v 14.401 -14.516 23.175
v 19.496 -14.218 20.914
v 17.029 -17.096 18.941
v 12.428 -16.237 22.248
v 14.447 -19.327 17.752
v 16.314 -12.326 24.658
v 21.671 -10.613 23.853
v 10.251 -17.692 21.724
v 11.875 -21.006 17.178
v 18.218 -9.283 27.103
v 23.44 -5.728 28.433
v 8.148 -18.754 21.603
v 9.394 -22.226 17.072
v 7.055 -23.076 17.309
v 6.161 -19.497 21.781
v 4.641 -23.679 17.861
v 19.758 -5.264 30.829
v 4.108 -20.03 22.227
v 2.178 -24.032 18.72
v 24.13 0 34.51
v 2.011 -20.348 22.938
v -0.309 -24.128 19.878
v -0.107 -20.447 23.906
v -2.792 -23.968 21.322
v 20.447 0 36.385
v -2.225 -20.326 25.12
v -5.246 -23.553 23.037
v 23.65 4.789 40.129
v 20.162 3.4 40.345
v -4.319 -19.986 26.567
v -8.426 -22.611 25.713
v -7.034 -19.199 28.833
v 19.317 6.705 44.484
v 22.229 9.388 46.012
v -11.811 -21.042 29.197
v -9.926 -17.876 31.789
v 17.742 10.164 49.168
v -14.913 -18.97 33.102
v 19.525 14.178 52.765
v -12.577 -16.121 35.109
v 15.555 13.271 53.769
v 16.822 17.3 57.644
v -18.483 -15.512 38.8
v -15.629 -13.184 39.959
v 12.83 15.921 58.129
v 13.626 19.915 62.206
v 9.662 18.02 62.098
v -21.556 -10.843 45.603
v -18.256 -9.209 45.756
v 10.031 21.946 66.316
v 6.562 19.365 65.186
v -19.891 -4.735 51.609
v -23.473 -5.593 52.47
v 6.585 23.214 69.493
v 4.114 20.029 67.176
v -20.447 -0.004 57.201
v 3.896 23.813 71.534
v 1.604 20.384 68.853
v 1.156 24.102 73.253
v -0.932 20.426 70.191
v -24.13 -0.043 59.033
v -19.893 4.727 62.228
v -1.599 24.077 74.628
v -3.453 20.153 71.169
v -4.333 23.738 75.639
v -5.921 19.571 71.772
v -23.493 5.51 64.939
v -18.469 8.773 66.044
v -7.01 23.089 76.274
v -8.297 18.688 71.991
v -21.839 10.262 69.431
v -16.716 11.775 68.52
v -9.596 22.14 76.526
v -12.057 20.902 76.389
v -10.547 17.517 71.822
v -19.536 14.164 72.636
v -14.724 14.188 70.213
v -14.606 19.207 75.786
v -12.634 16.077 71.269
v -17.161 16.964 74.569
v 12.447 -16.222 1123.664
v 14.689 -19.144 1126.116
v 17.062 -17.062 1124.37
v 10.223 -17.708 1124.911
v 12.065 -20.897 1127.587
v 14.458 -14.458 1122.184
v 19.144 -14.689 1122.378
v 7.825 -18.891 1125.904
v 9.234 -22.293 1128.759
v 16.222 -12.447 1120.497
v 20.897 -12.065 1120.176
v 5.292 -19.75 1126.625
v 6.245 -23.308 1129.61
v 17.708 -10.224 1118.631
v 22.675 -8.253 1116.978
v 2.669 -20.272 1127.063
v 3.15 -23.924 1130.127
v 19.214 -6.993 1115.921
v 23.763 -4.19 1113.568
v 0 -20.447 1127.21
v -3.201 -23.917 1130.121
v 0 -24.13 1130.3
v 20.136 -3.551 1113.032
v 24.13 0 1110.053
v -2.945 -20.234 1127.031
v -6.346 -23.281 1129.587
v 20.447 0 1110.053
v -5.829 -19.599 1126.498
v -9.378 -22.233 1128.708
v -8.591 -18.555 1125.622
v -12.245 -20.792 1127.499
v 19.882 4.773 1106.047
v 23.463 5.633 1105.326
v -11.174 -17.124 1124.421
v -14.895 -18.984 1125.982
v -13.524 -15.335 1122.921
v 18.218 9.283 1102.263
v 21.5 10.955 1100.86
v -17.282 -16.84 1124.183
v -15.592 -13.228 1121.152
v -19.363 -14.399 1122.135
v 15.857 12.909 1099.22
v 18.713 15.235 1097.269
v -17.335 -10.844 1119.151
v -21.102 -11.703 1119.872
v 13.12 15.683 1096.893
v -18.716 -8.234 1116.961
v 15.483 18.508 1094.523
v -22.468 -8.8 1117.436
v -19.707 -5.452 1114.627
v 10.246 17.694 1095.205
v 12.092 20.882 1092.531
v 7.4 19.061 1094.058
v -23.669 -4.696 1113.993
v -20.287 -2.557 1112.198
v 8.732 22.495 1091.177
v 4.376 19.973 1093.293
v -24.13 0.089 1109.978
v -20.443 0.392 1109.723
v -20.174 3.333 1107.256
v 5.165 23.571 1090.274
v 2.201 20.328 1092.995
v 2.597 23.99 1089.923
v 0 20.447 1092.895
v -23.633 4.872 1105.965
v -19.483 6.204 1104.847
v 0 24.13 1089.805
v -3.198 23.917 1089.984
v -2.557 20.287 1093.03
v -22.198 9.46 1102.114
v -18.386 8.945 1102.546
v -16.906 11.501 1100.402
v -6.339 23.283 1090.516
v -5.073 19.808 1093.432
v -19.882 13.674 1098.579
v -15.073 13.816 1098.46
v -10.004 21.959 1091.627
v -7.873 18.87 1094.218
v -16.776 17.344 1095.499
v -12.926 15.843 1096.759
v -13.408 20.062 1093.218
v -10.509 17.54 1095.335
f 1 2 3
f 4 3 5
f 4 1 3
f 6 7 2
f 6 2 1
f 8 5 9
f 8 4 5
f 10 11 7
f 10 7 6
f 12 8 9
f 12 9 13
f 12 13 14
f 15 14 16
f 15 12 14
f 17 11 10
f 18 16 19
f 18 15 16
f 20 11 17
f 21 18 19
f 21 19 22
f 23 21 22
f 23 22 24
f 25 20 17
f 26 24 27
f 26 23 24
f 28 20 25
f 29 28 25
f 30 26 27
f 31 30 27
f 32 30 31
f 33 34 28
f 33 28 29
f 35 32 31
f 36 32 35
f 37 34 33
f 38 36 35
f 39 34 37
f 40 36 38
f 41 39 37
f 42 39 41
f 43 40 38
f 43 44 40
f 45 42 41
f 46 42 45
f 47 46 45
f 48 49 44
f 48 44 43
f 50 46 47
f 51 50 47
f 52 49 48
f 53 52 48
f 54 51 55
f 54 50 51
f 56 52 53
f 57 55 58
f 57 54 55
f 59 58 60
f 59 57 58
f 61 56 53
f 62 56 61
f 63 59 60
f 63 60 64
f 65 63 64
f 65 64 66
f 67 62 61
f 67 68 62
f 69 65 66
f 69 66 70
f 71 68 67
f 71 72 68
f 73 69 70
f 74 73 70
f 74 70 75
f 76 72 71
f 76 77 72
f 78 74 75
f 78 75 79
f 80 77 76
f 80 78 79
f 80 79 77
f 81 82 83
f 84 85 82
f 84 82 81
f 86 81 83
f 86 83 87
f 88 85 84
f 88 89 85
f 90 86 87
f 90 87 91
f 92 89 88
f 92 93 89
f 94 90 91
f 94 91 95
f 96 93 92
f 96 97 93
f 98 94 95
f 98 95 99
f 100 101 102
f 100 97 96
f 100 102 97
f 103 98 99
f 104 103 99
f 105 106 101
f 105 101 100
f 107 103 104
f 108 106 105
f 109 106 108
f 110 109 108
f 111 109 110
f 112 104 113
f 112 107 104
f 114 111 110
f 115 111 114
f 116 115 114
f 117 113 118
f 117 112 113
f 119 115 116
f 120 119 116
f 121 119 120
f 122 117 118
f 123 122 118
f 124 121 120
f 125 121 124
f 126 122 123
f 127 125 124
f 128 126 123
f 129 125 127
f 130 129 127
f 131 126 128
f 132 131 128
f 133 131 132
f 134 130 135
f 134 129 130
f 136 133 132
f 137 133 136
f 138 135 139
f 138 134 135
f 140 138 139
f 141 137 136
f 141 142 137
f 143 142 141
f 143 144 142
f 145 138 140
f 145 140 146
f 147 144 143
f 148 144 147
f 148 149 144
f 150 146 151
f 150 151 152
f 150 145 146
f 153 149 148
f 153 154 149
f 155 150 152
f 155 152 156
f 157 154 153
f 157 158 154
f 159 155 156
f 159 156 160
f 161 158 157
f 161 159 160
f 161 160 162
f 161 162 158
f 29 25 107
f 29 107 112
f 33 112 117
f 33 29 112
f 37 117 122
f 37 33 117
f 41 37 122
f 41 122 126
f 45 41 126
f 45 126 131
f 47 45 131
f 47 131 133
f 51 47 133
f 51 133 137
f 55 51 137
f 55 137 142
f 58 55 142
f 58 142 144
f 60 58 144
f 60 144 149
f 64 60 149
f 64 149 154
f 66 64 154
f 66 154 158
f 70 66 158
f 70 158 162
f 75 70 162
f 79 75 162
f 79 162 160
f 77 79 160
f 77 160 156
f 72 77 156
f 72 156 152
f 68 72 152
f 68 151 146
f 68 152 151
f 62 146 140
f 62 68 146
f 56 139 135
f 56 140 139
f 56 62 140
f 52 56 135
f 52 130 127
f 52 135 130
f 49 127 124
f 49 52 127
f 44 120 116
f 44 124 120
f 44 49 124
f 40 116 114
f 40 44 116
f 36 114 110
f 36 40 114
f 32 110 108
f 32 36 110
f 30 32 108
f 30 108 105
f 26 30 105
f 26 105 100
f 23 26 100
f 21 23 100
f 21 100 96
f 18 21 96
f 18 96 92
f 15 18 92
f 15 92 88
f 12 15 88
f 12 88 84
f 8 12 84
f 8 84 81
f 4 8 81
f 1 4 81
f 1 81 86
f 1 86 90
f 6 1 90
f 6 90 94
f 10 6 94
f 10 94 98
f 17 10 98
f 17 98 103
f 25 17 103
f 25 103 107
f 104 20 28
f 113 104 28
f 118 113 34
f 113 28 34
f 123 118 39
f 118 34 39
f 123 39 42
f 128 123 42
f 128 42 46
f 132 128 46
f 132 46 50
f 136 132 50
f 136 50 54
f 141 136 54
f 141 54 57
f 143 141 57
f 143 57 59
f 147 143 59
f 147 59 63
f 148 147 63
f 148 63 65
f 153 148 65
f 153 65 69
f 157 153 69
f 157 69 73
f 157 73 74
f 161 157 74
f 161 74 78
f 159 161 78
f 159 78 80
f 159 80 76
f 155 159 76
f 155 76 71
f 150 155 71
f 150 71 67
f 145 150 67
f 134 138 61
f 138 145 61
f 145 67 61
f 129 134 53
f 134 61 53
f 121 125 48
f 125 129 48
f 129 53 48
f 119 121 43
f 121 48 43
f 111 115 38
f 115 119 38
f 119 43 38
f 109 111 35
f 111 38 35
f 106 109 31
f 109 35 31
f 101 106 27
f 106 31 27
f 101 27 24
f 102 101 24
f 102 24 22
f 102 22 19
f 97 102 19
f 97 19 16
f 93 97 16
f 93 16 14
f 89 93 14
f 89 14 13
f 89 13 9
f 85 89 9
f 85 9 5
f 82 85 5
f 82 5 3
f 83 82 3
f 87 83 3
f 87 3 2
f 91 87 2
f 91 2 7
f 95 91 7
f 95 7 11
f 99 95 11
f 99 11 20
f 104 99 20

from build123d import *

# Parameters (mm, degrees)
F0_R          = 24.13
F0_R_2        = 20.447
F1_DEPTH      = 1130.3
F3_DEPTH      = 24.131
F3_DEPTH_BACK = 24.131
F5_DEPTH      = 24.131
F5_DEPTH_BACK = 24.131
F8_W          = 178.4191885963
F8_H          = 167.3920117319
F9_DEPTH      = 50.8
F9_DEPTH_BACK = 20.32


with BuildPart() as f1:
    # F0 (on Top) → F1 (new body)
    with BuildSketch(Plane.XY):
        Circle(F0_R)
        Circle(F0_R_2, mode=Mode.SUBTRACT)
    extrude(amount=F1_DEPTH)

    # F2 (on Right) → F3 (cut, two sides)
    with BuildSketch(Plane.YZ) as f3_sk:
        Polygon((24.13, 1089.8050517994), (24.13, 1130.3), (-24.13, 1130.3), align=None)
    extrude(amount=-F3_DEPTH, mode=Mode.SUBTRACT)
    extrude(f3_sk.sketch, amount=F3_DEPTH_BACK, mode=Mode.SUBTRACT)

    # F4 (on Front) → F5 (cut, two sides)
    with BuildSketch(Plane.XZ) as f5_sk:
        Polygon((-28.575, 0), (28.575, 0), (-28.575, 29.0972948719), align=None)
    extrude(amount=F5_DEPTH, mode=Mode.SUBTRACT)
    extrude(f5_sk.sketch, amount=-F5_DEPTH_BACK, mode=Mode.SUBTRACT)

    # F8 (on line) → F9 (cut, two sides)
    with BuildSketch(Plane(origin=(2.9412132624, -6.4824828952, 5.7768372862), x_dir=(-0.9471380058, -0.2395200516, 0.2134472836), z_dir=(-0.3208264297, 0.7071067812, -0.6301352252))) as f9_sk:
        with Locations((5.3417463787, 7.3568988591)):
            Rectangle(F8_W, F8_H)
    extrude(amount=F9_DEPTH, mode=Mode.SUBTRACT)
    extrude(f9_sk.sketch, amount=-F9_DEPTH_BACK, mode=Mode.SUBTRACT)


solid = f1.part
